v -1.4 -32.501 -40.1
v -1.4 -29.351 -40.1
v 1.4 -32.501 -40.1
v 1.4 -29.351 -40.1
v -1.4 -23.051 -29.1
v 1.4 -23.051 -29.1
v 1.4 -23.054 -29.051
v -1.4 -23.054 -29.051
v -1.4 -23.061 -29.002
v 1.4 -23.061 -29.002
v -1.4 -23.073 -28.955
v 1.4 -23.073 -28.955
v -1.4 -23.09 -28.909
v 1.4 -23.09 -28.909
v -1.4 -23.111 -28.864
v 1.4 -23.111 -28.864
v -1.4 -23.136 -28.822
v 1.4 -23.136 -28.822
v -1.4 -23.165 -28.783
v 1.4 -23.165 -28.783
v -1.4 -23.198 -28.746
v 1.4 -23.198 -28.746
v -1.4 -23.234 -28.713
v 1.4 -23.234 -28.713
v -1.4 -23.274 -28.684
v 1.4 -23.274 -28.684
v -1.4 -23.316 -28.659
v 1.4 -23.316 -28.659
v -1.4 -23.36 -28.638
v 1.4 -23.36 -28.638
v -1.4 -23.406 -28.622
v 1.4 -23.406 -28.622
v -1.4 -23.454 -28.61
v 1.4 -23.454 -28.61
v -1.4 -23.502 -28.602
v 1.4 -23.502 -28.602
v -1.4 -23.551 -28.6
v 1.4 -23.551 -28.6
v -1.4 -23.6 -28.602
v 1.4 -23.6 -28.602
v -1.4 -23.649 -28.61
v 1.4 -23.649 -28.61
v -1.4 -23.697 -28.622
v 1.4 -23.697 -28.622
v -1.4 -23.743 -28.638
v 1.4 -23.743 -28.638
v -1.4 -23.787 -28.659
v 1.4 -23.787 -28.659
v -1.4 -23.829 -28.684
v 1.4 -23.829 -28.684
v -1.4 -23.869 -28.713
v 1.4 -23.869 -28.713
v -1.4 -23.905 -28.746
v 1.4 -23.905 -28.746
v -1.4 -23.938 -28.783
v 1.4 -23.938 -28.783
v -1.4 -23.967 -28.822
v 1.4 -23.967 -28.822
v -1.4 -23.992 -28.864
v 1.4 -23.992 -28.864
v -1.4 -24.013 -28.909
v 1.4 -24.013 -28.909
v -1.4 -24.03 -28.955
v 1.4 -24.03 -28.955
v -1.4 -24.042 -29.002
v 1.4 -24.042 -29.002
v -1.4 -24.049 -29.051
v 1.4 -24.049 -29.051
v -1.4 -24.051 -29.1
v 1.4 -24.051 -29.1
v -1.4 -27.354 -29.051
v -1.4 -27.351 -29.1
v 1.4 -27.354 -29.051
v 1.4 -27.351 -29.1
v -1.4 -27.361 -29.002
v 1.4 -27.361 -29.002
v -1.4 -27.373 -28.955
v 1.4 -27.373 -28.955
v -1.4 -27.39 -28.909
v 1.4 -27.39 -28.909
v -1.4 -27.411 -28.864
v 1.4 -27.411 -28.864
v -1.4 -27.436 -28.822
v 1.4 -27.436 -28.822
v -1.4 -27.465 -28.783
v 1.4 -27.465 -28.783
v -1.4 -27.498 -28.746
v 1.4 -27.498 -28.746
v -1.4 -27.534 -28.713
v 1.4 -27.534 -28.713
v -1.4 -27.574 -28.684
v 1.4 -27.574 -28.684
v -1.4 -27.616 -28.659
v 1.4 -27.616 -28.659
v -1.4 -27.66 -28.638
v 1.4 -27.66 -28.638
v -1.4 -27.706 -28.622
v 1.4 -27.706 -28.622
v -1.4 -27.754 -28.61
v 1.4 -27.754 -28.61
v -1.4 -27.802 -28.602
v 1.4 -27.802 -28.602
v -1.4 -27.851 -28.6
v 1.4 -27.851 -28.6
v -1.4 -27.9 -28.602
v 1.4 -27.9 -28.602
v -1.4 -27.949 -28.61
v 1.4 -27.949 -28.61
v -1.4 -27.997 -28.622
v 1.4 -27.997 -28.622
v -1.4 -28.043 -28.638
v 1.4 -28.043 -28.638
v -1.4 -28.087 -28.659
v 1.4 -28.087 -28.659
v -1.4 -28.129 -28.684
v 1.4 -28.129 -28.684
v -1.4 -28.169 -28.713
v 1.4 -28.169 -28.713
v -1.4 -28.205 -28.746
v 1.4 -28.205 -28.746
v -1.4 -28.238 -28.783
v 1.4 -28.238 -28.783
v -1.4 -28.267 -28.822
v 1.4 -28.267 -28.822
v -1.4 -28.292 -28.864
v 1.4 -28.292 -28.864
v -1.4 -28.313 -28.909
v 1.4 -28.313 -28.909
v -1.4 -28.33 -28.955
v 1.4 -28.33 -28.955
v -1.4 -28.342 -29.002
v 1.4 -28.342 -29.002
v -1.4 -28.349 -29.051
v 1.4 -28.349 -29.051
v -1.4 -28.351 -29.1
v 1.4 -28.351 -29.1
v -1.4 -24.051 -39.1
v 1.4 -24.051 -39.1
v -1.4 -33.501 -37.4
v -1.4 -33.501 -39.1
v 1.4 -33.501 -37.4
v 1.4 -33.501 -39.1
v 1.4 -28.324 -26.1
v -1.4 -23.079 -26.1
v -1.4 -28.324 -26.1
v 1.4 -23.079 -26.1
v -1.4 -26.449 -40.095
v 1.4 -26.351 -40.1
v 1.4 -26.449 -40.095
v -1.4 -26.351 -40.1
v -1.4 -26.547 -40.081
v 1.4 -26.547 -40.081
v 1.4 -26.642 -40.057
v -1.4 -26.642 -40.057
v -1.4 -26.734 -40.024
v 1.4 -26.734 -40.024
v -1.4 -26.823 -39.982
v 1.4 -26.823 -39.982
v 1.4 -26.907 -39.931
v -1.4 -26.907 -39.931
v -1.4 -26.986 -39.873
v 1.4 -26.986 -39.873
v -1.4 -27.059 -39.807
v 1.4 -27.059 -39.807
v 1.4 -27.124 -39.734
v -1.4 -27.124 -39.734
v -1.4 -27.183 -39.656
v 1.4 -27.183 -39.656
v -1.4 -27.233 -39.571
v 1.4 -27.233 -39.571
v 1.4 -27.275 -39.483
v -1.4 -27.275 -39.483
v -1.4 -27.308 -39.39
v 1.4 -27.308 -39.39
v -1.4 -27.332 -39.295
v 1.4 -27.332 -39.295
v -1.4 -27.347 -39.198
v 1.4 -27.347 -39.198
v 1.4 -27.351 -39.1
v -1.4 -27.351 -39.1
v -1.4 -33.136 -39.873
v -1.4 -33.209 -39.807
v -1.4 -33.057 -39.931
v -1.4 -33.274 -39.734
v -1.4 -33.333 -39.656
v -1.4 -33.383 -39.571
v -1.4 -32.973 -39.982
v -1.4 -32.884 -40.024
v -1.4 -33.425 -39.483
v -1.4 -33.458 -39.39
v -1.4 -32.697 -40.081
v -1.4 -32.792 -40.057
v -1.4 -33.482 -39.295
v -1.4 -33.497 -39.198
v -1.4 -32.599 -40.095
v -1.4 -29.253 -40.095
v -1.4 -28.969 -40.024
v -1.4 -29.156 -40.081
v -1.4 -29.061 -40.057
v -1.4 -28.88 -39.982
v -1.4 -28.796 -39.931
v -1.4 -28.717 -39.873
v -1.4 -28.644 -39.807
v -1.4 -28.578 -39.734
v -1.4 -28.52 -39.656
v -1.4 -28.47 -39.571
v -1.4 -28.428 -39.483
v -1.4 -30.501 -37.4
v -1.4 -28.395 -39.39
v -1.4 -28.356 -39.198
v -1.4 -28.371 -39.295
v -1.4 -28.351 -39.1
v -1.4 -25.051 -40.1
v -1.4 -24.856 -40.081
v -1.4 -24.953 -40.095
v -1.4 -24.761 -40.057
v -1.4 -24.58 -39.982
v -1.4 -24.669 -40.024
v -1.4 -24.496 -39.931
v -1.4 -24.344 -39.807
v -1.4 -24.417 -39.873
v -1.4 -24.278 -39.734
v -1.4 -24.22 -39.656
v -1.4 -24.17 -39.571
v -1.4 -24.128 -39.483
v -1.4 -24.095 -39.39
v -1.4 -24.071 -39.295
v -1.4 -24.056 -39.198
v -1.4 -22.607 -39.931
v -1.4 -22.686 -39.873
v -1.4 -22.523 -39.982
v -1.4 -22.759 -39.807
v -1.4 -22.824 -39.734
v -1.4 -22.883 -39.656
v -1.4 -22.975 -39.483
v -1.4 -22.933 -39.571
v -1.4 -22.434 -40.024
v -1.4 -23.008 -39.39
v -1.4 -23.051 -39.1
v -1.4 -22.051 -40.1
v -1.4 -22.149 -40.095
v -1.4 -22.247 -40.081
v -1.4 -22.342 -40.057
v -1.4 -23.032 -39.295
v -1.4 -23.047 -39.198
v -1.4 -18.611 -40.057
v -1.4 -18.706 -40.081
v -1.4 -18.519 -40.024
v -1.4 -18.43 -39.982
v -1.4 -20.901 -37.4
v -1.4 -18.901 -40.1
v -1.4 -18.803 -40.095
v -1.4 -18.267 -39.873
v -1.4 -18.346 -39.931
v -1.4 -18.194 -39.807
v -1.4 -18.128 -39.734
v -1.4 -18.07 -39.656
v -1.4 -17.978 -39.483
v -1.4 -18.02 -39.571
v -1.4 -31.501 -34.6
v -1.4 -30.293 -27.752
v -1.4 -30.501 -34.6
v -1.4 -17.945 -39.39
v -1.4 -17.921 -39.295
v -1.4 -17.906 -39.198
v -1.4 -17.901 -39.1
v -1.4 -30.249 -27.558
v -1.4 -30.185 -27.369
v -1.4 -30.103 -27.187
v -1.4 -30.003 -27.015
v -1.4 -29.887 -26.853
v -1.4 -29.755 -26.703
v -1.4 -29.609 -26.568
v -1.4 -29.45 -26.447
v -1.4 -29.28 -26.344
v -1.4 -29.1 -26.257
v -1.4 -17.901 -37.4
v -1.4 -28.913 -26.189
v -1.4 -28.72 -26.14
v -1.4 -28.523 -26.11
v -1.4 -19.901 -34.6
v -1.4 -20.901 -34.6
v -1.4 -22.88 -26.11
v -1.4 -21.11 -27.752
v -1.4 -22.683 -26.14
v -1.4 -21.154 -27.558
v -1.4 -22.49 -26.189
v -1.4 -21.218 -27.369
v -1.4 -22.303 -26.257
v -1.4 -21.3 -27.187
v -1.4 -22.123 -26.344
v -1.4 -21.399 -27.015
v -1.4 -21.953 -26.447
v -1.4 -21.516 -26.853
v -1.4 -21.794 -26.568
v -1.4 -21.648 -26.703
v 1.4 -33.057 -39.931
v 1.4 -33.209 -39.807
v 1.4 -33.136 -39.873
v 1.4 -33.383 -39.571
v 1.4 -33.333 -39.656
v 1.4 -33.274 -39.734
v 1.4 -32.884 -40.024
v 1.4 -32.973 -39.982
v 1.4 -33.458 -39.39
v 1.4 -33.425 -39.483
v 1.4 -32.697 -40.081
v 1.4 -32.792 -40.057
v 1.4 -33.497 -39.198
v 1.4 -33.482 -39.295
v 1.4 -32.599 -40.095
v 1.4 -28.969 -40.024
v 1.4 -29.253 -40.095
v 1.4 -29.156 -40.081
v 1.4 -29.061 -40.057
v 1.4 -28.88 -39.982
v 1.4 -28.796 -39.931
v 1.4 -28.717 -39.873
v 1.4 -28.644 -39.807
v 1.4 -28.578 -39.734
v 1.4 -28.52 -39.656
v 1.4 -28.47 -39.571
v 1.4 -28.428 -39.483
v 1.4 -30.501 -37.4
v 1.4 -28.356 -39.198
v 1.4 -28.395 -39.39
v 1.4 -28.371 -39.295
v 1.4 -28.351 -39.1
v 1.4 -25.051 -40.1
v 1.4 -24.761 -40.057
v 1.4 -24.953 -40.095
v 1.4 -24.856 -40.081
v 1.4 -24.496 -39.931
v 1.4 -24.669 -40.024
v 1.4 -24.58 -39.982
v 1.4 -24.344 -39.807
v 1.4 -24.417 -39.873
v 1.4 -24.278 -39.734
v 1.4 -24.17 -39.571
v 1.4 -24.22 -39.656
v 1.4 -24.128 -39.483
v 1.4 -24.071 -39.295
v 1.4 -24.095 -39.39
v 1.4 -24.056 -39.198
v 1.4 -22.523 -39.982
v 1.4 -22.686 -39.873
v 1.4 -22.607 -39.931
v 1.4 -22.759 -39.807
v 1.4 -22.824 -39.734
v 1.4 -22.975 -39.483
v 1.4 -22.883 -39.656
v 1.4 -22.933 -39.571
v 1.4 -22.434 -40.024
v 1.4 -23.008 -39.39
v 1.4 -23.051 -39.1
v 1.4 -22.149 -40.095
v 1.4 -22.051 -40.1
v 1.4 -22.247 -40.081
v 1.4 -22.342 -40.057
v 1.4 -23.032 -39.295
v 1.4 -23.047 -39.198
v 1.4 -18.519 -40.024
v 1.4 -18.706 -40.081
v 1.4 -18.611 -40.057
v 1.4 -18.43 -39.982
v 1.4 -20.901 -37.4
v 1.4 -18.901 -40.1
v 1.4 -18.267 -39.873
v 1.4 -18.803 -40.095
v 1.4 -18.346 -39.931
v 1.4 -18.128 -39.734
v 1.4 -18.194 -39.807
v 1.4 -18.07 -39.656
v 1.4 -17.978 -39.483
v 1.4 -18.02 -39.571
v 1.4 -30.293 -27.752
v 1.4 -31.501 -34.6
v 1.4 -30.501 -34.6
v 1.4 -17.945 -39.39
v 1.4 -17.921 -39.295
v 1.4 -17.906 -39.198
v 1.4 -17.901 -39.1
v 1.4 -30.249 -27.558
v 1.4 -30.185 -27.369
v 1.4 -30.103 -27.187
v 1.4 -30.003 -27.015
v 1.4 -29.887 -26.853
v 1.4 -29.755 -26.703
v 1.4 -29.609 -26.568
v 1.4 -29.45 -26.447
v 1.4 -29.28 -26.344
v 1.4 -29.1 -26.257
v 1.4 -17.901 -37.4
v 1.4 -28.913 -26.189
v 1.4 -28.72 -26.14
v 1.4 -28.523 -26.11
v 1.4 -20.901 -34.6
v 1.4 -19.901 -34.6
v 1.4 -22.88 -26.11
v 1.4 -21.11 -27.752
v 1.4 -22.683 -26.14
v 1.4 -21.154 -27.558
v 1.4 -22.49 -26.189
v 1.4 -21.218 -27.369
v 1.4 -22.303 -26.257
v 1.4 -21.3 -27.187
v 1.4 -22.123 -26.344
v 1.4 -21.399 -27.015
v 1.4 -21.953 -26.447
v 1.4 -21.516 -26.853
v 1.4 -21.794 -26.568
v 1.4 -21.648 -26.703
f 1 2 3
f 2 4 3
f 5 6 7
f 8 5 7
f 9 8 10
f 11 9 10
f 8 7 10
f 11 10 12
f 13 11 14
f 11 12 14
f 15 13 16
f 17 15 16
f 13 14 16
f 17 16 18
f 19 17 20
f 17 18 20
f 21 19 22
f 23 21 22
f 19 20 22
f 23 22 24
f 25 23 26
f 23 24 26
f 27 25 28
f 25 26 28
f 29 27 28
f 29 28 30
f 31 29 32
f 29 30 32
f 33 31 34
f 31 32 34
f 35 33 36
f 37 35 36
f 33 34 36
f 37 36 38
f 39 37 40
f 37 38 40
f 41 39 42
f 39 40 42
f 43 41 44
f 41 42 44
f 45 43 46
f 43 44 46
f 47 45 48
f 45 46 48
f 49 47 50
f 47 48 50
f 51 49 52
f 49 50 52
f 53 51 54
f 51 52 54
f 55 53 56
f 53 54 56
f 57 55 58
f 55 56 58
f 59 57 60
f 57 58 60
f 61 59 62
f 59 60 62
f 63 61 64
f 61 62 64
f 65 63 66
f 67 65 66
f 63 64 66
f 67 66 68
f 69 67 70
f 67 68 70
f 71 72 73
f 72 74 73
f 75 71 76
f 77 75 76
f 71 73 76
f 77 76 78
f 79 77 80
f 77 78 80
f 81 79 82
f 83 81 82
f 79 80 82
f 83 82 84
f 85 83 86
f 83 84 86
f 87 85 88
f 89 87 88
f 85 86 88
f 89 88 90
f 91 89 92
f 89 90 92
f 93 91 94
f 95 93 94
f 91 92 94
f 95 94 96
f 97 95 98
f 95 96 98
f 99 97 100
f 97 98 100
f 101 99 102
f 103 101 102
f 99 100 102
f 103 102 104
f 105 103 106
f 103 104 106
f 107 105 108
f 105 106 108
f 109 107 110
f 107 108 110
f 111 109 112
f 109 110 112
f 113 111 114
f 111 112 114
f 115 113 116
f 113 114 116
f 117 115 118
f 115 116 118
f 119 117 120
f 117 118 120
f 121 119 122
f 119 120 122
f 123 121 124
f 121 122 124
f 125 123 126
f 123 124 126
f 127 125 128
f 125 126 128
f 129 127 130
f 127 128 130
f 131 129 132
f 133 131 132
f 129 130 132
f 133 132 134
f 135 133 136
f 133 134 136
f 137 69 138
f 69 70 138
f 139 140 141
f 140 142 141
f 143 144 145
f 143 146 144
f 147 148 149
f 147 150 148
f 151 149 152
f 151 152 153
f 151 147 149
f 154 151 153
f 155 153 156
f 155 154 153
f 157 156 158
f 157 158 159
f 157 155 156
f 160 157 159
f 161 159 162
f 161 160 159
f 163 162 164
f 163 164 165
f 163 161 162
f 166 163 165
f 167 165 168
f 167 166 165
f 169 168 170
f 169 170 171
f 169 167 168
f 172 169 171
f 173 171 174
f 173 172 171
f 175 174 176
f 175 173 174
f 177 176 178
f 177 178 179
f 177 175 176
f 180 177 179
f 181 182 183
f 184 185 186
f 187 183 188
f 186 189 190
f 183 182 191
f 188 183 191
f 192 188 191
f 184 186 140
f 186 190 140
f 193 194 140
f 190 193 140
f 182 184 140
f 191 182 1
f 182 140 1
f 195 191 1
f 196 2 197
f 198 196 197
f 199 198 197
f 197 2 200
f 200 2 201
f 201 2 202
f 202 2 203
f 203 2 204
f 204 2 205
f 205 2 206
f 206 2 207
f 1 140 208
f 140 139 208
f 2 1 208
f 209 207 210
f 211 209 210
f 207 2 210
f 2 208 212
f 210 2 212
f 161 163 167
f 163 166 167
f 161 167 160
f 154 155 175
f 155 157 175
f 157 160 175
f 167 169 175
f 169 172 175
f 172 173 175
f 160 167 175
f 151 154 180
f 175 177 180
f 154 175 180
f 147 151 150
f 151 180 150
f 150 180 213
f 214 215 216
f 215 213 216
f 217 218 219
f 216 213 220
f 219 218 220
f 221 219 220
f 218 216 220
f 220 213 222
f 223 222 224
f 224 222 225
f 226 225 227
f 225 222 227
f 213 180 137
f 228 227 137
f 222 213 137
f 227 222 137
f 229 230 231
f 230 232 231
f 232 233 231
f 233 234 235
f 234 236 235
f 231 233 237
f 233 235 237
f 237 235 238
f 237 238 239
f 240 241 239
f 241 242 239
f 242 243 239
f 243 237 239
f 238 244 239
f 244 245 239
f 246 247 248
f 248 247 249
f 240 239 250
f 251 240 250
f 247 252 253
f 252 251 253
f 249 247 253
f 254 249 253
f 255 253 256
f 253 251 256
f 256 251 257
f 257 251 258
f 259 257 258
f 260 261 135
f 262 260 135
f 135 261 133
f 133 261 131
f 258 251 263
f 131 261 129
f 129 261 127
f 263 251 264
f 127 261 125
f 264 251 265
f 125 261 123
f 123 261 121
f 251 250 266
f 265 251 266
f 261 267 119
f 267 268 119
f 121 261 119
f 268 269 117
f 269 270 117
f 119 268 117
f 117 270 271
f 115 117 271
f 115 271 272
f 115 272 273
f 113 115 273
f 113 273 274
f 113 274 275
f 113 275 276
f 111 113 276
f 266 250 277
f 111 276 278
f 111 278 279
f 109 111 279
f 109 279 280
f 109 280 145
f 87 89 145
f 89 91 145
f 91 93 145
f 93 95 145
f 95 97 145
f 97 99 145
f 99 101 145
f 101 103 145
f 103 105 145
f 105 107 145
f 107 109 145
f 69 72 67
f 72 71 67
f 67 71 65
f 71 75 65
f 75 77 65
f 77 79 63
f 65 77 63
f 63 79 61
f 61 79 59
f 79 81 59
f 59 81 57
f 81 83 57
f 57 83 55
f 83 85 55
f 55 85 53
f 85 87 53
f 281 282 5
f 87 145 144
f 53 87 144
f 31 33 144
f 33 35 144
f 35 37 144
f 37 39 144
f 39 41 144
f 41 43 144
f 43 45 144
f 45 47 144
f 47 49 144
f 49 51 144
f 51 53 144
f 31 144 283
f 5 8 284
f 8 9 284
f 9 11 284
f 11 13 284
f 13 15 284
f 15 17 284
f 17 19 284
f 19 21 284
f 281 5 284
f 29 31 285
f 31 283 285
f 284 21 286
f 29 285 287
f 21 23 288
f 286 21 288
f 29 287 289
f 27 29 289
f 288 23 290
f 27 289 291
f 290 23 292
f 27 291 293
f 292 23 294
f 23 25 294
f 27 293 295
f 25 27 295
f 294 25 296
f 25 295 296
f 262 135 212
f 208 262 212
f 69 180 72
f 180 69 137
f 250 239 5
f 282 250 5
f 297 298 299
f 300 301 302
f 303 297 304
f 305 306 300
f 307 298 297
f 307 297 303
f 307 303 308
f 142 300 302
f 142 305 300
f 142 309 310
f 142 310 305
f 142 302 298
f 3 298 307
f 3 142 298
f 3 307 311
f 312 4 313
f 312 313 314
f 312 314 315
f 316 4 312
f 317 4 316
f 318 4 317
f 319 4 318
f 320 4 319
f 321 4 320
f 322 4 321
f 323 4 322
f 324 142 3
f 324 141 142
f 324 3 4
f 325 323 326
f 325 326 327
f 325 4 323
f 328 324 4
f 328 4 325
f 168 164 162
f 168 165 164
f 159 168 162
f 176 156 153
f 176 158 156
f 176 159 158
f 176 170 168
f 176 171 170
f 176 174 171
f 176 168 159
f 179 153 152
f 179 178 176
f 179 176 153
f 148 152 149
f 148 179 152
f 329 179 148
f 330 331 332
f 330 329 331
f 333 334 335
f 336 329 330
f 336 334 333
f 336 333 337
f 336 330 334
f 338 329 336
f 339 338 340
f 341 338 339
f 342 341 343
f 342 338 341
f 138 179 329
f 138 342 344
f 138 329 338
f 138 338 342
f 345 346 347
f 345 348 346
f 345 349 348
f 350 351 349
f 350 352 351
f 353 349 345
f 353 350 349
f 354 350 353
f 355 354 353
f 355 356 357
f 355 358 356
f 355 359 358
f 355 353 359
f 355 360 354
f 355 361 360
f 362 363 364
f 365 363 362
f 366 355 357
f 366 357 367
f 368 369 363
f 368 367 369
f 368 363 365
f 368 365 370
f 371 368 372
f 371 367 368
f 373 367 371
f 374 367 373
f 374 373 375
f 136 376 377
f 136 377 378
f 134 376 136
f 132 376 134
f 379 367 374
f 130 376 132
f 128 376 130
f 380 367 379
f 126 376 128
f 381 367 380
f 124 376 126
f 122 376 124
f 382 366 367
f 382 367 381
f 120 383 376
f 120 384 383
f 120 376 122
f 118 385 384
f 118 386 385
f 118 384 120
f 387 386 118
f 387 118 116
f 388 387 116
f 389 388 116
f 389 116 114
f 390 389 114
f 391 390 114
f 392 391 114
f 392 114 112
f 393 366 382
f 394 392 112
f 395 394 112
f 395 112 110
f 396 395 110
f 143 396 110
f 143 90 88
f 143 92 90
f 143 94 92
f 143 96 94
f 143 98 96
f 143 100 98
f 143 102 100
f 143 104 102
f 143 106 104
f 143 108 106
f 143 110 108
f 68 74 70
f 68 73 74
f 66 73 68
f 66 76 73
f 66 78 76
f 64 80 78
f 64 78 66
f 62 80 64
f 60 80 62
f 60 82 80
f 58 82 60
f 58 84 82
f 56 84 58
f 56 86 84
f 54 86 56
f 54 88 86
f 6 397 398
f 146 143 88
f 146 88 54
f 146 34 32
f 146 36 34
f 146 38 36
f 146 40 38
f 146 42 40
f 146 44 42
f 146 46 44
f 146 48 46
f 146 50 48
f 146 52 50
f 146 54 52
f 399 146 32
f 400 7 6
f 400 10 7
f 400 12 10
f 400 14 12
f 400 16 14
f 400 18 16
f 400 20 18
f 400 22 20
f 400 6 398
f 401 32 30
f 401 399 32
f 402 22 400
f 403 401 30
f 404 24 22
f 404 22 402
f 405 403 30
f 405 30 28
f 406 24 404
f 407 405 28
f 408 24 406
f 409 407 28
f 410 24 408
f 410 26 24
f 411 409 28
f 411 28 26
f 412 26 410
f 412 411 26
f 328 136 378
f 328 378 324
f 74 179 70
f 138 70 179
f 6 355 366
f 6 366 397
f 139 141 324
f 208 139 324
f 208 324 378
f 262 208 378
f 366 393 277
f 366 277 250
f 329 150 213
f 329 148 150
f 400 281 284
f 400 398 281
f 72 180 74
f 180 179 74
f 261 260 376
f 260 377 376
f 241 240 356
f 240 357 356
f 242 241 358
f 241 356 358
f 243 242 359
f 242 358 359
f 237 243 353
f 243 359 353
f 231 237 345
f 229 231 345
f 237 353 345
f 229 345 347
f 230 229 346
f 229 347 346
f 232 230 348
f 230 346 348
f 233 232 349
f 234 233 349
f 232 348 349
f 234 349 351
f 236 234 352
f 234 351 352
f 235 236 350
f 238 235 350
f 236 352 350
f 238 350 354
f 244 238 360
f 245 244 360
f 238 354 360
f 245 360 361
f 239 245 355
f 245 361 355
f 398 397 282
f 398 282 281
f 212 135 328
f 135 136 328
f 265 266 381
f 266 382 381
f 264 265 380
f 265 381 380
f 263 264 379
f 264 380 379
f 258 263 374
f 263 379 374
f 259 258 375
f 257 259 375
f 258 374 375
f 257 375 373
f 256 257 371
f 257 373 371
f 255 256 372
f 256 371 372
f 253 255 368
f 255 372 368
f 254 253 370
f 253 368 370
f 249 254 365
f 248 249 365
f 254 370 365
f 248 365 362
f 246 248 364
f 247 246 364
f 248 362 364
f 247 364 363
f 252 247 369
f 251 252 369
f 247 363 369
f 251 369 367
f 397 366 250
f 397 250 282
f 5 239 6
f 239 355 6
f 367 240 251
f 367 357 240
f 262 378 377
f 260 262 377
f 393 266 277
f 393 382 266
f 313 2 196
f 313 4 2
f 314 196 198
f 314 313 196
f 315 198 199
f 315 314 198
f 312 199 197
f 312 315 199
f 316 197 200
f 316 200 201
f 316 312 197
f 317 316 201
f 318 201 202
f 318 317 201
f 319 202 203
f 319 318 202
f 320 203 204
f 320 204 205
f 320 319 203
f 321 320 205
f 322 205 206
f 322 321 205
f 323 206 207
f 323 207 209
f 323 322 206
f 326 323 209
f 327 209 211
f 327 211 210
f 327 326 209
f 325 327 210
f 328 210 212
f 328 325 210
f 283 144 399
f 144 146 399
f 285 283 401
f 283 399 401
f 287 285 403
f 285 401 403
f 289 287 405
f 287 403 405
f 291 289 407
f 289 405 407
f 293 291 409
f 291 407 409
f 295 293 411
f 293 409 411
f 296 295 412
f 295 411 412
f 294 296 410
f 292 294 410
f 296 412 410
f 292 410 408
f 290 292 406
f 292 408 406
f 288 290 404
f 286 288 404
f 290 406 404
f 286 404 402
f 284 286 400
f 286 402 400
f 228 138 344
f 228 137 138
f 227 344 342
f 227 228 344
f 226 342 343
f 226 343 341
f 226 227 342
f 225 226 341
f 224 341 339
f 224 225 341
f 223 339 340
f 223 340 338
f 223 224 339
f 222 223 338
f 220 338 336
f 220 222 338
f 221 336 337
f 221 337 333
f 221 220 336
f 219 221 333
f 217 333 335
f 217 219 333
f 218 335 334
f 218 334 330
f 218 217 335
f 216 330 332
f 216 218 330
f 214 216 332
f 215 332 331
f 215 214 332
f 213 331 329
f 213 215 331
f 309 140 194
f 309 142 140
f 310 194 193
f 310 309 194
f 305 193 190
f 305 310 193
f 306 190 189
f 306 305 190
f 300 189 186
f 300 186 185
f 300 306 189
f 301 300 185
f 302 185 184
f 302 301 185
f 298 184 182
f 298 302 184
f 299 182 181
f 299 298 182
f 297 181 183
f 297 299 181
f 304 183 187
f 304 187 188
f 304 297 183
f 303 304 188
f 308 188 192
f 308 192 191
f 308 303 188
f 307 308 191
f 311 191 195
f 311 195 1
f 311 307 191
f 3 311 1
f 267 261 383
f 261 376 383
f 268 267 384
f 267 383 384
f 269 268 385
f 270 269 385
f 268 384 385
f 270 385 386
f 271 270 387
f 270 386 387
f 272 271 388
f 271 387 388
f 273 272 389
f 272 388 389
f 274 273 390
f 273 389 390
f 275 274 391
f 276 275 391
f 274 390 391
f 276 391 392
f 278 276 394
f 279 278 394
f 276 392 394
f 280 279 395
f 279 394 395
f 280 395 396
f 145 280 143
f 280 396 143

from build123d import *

# Parameters (mm, degrees)
PAD029_DEPTH = 1.4
FILLET005_R  = 2
FILLET006_R  = 1


with BuildPart() as part:
    # Sketch046 → Pad029 (new body, symmetric)
    with BuildSketch(Plane.YZ):
        with BuildLine():
            Line((-25.701481, -40.1), (-24.051481, -40.1))
            Line((-24.051481, -29.1), (-24.051481, -40.1))
            ThreePointArc((-23.051481, -29.1), (-23.551481, -28.6), (-24.051481, -29.1))
            Line((-23.051481, -40.1), (-23.051481, -29.1))
            Line((-23.051481, -40.1), (-17.901481, -40.1))
            Line((-17.901481, -40.1), (-17.901481, -37.4))
            Line((-17.901481, -37.4), (-20.901481, -37.4))
            Line((-20.901481, -37.4), (-20.901481, -34.6))
            Line((-20.901481, -34.6), (-19.901481, -34.6))
            Line((-19.901481, -34.6), (-21.401481, -26.1))
            Line((-21.401481, -26.1), (-25.701481, -26.1))
            Line((-25.701481, -26.1), (-30.001481, -26.1))
            Line((-31.501481, -34.6), (-30.001481, -26.1))
            Line((-30.501481, -34.6), (-31.501481, -34.6))
            Line((-30.501481, -37.4), (-30.501481, -34.6))
            Line((-33.501481, -37.4), (-30.501481, -37.4))
            Line((-33.501481, -40.1), (-33.501481, -37.4))
            Line((-28.351481, -40.1), (-33.501481, -40.1))
            Line((-28.351481, -29.1), (-28.351481, -40.1))
            ThreePointArc((-27.351481, -29.1), (-27.851481, -28.6), (-28.351481, -29.1))
            Line((-27.351481, -40.1), (-27.351481, -29.1))
            Line((-25.701481, -40.1), (-27.351481, -40.1))
        make_face()
    extrude(amount=PAD029_DEPTH, both=True)

    # Fillet005
    fillet005_edges = [part.edges().sort_by_distance(p)[0] for p in [
        (0, -21.401481, -26.1),
        (0, -30.001481, -26.1),
    ]]
    fillet(fillet005_edges, radius=FILLET005_R)

    # Fillet006
    fillet006_edges = [part.edges().sort_by_distance(p)[0] for p in [
        (0, -33.501481, -40.1),
        (0, -17.901481, -40.1),
        (0, -28.351481, -40.1),
        (0, -27.351481, -40.1),
        (0, -24.051481, -40.1),
        (0, -23.051481, -40.1),
    ]]
    fillet(fillet006_edges, radius=FILLET006_R)


solid = part.part
